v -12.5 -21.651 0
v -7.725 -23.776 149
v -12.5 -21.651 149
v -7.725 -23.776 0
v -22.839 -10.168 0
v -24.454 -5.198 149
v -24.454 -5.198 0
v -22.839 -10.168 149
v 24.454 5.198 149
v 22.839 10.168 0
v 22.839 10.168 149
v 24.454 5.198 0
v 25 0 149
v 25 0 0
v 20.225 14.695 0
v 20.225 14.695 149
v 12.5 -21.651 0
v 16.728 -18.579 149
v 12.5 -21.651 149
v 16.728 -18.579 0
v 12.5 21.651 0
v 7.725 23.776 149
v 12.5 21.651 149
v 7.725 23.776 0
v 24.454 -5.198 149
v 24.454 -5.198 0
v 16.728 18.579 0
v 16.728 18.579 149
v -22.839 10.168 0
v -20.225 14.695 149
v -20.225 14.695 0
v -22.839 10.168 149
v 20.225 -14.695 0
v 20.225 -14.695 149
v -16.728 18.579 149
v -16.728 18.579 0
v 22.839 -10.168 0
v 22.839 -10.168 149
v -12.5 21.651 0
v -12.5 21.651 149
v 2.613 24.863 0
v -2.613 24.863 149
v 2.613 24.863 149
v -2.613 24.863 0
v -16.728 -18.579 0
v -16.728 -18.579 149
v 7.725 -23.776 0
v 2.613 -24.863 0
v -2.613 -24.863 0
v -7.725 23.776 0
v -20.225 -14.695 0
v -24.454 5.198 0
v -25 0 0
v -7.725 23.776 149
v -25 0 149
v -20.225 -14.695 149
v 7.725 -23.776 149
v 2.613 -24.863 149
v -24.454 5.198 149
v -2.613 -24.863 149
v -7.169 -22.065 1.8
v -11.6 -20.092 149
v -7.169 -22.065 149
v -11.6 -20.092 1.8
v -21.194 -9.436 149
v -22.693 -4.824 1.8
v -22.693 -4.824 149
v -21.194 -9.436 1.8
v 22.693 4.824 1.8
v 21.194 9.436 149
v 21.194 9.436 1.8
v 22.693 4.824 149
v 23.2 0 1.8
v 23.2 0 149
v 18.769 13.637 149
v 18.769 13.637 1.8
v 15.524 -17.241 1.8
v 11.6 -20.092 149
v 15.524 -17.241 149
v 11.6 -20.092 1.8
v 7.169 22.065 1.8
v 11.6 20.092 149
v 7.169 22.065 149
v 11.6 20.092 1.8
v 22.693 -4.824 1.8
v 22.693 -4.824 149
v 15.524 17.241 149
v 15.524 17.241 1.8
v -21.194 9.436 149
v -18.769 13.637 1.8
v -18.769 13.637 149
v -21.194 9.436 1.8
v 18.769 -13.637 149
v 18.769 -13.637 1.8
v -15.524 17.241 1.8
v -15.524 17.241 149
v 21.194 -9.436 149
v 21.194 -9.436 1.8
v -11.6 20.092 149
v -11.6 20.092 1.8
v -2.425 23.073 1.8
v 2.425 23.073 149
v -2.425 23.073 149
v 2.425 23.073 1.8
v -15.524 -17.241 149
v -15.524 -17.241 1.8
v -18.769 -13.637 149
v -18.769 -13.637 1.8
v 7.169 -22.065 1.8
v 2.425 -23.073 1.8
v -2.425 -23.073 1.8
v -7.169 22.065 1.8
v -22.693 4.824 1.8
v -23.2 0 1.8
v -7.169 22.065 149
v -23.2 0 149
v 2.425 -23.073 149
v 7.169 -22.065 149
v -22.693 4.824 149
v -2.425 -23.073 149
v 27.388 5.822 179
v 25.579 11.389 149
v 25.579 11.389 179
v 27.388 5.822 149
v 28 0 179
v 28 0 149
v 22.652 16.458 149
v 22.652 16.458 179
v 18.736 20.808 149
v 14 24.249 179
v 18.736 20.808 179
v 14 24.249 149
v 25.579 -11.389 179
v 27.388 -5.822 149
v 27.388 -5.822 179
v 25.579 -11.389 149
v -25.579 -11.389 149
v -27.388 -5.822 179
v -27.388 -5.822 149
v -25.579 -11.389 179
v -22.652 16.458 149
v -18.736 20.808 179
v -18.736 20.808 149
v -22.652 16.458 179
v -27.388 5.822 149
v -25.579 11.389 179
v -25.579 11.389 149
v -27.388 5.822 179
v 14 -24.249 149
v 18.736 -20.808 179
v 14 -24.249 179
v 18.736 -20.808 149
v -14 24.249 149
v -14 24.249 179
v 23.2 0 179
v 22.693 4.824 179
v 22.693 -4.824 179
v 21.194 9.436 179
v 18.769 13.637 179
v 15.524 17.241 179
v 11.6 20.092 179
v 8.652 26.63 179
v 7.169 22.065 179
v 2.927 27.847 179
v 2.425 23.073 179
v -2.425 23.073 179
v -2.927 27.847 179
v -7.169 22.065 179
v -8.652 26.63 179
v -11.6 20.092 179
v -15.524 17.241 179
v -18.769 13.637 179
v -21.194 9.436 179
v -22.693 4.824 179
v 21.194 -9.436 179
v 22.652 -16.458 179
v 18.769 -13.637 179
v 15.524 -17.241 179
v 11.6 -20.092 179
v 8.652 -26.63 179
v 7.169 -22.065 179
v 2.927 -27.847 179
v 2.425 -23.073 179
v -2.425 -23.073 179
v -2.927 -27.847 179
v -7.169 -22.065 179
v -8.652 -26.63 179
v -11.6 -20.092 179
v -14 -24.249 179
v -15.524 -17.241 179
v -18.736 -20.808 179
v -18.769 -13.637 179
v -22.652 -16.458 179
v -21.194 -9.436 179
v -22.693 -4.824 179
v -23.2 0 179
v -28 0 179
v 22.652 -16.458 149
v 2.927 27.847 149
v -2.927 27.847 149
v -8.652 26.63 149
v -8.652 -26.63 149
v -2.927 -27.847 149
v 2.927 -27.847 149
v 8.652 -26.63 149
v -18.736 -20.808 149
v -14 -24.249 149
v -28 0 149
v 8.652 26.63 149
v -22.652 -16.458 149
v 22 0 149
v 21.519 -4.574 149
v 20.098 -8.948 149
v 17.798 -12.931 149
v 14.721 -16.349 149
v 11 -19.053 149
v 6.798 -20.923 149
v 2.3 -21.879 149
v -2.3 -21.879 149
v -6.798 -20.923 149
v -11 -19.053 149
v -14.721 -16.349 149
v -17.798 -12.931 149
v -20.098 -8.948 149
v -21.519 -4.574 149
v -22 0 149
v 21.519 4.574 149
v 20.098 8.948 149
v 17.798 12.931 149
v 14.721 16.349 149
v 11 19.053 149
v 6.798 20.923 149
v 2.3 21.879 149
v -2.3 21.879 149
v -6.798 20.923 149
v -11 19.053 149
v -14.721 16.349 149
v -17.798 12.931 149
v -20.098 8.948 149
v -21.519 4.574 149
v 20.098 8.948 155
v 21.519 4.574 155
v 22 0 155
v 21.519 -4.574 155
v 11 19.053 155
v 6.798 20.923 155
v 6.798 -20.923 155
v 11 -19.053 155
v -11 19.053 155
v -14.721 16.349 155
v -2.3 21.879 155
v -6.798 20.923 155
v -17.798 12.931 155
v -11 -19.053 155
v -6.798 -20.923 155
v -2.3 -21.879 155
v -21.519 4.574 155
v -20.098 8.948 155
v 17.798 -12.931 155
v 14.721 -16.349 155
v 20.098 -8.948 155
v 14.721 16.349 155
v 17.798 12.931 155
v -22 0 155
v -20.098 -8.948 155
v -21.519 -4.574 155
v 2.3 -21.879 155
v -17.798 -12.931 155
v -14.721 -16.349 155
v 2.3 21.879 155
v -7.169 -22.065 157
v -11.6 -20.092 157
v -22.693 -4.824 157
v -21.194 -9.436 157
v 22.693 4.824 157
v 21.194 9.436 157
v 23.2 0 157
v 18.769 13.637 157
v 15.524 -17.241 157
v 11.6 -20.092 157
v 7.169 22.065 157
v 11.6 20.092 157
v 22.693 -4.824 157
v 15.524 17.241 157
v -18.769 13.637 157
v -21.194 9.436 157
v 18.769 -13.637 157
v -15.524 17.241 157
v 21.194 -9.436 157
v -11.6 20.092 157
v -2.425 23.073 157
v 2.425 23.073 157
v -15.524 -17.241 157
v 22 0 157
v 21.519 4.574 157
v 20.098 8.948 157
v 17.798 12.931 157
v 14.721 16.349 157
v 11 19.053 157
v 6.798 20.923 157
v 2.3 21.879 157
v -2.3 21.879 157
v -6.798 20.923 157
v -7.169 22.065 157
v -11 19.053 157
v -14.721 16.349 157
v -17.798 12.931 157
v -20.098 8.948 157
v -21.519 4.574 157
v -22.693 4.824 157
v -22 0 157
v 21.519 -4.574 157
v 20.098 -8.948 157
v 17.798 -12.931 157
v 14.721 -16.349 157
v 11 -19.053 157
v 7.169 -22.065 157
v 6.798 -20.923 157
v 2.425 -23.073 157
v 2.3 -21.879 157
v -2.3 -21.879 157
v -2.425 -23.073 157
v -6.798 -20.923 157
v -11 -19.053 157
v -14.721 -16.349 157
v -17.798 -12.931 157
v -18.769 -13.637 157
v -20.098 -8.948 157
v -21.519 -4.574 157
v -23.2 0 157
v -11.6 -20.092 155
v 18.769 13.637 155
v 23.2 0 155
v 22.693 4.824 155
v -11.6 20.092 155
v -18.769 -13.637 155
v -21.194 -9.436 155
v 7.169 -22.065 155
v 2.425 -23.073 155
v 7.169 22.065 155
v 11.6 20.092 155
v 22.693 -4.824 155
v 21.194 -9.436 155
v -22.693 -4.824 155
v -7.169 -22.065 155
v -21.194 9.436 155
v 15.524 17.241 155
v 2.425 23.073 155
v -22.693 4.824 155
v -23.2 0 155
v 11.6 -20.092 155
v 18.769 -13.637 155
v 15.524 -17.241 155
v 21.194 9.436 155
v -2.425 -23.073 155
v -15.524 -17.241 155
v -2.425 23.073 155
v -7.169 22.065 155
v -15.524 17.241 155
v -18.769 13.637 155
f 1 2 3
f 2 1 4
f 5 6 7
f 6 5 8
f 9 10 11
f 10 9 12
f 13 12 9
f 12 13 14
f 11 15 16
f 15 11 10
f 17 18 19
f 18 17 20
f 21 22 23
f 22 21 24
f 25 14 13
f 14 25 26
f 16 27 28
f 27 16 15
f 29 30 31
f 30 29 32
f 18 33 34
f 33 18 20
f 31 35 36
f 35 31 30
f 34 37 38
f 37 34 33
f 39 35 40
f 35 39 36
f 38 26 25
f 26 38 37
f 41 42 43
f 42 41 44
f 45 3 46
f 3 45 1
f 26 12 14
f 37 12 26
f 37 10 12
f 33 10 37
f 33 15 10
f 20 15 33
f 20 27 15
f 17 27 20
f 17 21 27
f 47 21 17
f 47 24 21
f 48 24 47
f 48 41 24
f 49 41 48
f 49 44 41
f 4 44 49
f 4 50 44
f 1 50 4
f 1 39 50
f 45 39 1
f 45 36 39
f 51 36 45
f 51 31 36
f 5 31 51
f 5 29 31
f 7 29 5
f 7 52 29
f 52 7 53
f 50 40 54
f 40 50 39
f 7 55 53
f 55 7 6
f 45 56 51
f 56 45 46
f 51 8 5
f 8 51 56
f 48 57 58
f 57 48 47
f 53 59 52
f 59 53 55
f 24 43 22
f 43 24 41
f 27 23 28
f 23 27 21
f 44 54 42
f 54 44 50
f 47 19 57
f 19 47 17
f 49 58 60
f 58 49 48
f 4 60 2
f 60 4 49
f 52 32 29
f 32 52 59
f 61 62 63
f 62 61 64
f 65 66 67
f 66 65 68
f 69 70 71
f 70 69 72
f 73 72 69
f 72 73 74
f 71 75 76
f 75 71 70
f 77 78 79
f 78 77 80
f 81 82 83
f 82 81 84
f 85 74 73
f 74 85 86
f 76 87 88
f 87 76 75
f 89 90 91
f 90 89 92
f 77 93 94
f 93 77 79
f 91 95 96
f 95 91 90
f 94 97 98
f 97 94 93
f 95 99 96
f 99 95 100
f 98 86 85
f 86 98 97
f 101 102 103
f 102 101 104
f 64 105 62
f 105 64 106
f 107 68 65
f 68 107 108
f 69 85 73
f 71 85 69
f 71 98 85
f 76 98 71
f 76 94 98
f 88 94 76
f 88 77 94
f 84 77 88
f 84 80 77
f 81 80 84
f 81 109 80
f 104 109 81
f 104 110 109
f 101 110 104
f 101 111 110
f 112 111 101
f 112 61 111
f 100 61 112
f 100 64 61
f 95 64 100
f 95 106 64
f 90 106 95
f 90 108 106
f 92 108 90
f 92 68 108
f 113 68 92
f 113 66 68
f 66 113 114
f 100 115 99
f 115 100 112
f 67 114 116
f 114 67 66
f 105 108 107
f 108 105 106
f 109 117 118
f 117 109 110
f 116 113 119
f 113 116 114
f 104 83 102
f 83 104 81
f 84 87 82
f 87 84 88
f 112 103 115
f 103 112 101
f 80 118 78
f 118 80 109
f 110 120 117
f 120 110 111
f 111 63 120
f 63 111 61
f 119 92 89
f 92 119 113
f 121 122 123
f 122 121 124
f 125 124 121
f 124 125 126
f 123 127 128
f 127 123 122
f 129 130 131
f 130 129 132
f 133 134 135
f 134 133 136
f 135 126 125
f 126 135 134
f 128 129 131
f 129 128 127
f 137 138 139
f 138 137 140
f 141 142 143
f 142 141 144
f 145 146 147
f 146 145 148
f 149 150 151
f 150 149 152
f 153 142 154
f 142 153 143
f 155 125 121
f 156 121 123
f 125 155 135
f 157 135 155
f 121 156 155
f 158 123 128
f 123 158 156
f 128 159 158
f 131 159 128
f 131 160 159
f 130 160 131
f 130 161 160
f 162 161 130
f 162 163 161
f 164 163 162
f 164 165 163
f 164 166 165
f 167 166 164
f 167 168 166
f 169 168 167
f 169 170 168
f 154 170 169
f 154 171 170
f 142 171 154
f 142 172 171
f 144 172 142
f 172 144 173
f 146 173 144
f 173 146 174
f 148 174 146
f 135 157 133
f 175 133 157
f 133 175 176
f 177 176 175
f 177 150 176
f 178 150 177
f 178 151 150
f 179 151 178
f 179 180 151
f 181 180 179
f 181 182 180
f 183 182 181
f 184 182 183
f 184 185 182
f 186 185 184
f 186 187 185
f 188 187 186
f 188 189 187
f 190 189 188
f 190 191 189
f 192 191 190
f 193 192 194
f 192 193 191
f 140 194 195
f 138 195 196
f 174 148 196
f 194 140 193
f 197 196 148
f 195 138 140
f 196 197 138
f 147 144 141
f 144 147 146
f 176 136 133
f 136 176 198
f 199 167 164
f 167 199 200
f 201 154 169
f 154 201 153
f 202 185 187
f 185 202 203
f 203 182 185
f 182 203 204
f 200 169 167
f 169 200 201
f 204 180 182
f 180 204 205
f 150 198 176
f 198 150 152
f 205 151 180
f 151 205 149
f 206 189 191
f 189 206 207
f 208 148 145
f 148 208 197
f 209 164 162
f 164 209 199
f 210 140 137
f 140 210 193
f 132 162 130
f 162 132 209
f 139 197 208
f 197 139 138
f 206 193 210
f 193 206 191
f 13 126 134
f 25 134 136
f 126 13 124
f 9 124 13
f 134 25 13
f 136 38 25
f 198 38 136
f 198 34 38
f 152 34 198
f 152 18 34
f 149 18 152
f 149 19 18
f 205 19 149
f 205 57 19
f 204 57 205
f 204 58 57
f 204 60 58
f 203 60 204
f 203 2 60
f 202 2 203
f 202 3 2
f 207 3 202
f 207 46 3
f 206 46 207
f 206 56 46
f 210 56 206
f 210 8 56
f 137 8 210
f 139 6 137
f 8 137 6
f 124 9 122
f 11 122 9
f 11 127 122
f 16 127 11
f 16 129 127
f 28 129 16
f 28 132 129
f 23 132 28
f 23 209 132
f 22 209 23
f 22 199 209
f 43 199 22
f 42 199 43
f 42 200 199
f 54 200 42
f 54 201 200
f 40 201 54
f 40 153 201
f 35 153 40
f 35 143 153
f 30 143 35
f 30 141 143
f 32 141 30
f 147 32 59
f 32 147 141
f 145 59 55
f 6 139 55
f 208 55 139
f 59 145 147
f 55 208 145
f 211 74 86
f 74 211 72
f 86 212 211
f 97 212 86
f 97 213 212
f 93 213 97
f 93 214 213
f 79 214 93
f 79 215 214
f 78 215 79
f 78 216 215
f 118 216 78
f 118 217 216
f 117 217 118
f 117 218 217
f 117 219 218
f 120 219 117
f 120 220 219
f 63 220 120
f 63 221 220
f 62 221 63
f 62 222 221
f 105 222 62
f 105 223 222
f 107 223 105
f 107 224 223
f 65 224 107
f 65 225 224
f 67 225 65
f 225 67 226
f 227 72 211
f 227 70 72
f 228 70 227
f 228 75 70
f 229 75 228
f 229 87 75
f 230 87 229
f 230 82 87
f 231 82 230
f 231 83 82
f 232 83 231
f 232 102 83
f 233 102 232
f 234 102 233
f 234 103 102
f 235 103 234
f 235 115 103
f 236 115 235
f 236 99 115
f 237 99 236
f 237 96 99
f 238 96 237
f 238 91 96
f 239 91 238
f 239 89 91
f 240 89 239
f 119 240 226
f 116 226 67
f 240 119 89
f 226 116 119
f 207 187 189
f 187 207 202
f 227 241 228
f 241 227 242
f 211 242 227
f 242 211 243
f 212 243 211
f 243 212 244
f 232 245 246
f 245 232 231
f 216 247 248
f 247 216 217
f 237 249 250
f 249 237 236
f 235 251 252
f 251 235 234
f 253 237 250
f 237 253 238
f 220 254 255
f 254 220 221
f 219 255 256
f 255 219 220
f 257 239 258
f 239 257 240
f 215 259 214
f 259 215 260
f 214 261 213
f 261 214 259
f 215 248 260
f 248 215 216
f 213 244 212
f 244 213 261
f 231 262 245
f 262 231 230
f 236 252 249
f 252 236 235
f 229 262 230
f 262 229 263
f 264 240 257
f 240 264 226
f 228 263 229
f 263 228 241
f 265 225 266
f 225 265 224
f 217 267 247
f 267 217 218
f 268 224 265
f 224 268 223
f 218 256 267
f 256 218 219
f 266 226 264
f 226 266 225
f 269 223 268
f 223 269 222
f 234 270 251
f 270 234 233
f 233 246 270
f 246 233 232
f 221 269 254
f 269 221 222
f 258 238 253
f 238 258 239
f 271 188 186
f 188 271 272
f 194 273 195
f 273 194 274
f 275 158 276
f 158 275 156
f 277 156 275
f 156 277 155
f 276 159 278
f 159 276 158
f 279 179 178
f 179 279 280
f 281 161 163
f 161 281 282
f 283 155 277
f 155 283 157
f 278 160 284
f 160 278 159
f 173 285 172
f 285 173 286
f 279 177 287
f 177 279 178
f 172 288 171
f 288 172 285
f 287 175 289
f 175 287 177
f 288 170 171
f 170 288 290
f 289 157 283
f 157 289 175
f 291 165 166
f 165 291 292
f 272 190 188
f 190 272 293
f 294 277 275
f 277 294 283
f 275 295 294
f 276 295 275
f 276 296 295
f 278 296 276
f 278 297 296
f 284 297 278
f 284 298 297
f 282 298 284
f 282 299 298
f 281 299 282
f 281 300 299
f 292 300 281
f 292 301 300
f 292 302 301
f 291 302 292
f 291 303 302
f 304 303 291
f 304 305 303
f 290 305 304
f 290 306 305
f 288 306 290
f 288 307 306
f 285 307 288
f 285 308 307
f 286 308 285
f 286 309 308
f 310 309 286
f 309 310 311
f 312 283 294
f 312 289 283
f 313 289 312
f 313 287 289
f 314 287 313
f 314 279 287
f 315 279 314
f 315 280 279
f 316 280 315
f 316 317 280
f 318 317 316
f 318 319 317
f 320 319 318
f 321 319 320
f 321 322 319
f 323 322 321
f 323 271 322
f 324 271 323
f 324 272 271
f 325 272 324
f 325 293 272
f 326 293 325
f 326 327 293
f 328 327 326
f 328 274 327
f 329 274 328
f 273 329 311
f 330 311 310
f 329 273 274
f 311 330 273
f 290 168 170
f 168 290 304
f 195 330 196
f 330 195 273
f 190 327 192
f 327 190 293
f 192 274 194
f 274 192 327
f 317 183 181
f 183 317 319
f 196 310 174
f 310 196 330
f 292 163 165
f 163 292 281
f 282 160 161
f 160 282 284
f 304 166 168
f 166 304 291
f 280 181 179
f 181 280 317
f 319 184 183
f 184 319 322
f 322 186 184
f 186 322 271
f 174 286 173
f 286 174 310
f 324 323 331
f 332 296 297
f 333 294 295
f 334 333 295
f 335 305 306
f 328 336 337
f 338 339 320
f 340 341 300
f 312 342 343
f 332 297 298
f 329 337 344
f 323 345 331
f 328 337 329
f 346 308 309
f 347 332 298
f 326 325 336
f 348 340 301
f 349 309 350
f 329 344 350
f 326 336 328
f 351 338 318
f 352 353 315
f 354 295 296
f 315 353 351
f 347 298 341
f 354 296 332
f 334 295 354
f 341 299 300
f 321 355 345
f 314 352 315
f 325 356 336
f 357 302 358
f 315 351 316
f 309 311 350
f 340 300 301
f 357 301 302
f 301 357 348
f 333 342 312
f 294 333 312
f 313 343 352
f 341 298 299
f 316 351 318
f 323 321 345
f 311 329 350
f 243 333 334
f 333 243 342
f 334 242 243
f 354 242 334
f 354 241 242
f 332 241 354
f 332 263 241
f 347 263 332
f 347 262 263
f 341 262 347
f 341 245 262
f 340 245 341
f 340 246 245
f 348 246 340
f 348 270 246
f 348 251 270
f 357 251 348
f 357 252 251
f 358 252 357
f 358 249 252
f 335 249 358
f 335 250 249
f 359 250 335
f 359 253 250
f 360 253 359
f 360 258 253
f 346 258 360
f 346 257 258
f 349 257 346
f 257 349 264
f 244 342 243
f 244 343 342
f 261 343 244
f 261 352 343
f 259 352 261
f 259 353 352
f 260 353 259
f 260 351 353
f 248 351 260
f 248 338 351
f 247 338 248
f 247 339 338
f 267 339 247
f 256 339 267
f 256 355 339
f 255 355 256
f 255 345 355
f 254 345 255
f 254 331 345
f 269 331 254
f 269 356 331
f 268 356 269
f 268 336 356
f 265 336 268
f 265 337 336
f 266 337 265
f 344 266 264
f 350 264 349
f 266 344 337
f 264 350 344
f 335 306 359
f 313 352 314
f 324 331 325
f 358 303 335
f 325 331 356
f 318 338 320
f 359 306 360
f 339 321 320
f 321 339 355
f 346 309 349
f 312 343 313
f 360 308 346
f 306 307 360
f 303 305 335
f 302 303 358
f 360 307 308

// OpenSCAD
// Parameters
pipe_standard = 1; //[1:1:1]
nominal_size = 50; //[25:100:1]
length_mm = 150; //[75:300:1]
include_end_fitting = 1; //[0:1:1]
od_mm = 50; //[25:100:0.5]
wall_mm = 1.8; //[0.9:3.6:0.1]
overlap_mm = 1; //[0.5:2:0.1]
fitting_len_mm = 30; //[15:60:1]
fitting_od_extra_mm = 6; //[3:12:0.5]
socket_wall_extra_mm = 1.2; //[0.6:2.4:0.1]
socket_depth_mm = 22; //[11:44:1]
chamfer_len_mm = 2; //[1:5:0.5]

// Ht Pipe - complete geometry
module ht_pipe() {
  color([0.85, 0.85, 0.8]) { // PVC color
    union() {
      // Pipe segment
      difference() {
        cylinder(h=length_mm, r=od_mm/2, center=false);
        translate([0, 0, wall_mm])
          cylinder(h=length_mm, r=od_mm/2 - wall_mm, center=false);
      }
      
      // Integrated end fitting
      if (include_end_fitting) {
        difference() {
          translate([0, 0, length_mm - overlap_mm])
            cylinder(h=fitting_len_mm, r=od_mm/2 + fitting_od_extra_mm/2, center=false);
          
          // Bore void
          translate([0, 0, length_mm - overlap_mm])
            cylinder(h=fitting_len_mm, r=od_mm/2 - wall_mm - socket_wall_extra_mm, center=false);
          
          // Socket void
          translate([0, 0, length_mm - overlap_mm + (fitting_len_mm - socket_depth_mm)])
            cylinder(h=socket_depth_mm, r=od_mm/2 - wall_mm, center=false);
          
          // Chamfer void
          translate([0, 0, length_mm - overlap_mm + (fitting_len_mm - socket_depth_mm) - chamfer_len_mm])
            cylinder(h=chamfer_len_mm, r1=od_mm/2 - wall_mm, r2=od_mm/2 - wall_mm - socket_wall_extra_mm, center=false);
        }
      }
    }
  }
}

// Assembly
module assembly() {
  ht_pipe();
}

assembly();
